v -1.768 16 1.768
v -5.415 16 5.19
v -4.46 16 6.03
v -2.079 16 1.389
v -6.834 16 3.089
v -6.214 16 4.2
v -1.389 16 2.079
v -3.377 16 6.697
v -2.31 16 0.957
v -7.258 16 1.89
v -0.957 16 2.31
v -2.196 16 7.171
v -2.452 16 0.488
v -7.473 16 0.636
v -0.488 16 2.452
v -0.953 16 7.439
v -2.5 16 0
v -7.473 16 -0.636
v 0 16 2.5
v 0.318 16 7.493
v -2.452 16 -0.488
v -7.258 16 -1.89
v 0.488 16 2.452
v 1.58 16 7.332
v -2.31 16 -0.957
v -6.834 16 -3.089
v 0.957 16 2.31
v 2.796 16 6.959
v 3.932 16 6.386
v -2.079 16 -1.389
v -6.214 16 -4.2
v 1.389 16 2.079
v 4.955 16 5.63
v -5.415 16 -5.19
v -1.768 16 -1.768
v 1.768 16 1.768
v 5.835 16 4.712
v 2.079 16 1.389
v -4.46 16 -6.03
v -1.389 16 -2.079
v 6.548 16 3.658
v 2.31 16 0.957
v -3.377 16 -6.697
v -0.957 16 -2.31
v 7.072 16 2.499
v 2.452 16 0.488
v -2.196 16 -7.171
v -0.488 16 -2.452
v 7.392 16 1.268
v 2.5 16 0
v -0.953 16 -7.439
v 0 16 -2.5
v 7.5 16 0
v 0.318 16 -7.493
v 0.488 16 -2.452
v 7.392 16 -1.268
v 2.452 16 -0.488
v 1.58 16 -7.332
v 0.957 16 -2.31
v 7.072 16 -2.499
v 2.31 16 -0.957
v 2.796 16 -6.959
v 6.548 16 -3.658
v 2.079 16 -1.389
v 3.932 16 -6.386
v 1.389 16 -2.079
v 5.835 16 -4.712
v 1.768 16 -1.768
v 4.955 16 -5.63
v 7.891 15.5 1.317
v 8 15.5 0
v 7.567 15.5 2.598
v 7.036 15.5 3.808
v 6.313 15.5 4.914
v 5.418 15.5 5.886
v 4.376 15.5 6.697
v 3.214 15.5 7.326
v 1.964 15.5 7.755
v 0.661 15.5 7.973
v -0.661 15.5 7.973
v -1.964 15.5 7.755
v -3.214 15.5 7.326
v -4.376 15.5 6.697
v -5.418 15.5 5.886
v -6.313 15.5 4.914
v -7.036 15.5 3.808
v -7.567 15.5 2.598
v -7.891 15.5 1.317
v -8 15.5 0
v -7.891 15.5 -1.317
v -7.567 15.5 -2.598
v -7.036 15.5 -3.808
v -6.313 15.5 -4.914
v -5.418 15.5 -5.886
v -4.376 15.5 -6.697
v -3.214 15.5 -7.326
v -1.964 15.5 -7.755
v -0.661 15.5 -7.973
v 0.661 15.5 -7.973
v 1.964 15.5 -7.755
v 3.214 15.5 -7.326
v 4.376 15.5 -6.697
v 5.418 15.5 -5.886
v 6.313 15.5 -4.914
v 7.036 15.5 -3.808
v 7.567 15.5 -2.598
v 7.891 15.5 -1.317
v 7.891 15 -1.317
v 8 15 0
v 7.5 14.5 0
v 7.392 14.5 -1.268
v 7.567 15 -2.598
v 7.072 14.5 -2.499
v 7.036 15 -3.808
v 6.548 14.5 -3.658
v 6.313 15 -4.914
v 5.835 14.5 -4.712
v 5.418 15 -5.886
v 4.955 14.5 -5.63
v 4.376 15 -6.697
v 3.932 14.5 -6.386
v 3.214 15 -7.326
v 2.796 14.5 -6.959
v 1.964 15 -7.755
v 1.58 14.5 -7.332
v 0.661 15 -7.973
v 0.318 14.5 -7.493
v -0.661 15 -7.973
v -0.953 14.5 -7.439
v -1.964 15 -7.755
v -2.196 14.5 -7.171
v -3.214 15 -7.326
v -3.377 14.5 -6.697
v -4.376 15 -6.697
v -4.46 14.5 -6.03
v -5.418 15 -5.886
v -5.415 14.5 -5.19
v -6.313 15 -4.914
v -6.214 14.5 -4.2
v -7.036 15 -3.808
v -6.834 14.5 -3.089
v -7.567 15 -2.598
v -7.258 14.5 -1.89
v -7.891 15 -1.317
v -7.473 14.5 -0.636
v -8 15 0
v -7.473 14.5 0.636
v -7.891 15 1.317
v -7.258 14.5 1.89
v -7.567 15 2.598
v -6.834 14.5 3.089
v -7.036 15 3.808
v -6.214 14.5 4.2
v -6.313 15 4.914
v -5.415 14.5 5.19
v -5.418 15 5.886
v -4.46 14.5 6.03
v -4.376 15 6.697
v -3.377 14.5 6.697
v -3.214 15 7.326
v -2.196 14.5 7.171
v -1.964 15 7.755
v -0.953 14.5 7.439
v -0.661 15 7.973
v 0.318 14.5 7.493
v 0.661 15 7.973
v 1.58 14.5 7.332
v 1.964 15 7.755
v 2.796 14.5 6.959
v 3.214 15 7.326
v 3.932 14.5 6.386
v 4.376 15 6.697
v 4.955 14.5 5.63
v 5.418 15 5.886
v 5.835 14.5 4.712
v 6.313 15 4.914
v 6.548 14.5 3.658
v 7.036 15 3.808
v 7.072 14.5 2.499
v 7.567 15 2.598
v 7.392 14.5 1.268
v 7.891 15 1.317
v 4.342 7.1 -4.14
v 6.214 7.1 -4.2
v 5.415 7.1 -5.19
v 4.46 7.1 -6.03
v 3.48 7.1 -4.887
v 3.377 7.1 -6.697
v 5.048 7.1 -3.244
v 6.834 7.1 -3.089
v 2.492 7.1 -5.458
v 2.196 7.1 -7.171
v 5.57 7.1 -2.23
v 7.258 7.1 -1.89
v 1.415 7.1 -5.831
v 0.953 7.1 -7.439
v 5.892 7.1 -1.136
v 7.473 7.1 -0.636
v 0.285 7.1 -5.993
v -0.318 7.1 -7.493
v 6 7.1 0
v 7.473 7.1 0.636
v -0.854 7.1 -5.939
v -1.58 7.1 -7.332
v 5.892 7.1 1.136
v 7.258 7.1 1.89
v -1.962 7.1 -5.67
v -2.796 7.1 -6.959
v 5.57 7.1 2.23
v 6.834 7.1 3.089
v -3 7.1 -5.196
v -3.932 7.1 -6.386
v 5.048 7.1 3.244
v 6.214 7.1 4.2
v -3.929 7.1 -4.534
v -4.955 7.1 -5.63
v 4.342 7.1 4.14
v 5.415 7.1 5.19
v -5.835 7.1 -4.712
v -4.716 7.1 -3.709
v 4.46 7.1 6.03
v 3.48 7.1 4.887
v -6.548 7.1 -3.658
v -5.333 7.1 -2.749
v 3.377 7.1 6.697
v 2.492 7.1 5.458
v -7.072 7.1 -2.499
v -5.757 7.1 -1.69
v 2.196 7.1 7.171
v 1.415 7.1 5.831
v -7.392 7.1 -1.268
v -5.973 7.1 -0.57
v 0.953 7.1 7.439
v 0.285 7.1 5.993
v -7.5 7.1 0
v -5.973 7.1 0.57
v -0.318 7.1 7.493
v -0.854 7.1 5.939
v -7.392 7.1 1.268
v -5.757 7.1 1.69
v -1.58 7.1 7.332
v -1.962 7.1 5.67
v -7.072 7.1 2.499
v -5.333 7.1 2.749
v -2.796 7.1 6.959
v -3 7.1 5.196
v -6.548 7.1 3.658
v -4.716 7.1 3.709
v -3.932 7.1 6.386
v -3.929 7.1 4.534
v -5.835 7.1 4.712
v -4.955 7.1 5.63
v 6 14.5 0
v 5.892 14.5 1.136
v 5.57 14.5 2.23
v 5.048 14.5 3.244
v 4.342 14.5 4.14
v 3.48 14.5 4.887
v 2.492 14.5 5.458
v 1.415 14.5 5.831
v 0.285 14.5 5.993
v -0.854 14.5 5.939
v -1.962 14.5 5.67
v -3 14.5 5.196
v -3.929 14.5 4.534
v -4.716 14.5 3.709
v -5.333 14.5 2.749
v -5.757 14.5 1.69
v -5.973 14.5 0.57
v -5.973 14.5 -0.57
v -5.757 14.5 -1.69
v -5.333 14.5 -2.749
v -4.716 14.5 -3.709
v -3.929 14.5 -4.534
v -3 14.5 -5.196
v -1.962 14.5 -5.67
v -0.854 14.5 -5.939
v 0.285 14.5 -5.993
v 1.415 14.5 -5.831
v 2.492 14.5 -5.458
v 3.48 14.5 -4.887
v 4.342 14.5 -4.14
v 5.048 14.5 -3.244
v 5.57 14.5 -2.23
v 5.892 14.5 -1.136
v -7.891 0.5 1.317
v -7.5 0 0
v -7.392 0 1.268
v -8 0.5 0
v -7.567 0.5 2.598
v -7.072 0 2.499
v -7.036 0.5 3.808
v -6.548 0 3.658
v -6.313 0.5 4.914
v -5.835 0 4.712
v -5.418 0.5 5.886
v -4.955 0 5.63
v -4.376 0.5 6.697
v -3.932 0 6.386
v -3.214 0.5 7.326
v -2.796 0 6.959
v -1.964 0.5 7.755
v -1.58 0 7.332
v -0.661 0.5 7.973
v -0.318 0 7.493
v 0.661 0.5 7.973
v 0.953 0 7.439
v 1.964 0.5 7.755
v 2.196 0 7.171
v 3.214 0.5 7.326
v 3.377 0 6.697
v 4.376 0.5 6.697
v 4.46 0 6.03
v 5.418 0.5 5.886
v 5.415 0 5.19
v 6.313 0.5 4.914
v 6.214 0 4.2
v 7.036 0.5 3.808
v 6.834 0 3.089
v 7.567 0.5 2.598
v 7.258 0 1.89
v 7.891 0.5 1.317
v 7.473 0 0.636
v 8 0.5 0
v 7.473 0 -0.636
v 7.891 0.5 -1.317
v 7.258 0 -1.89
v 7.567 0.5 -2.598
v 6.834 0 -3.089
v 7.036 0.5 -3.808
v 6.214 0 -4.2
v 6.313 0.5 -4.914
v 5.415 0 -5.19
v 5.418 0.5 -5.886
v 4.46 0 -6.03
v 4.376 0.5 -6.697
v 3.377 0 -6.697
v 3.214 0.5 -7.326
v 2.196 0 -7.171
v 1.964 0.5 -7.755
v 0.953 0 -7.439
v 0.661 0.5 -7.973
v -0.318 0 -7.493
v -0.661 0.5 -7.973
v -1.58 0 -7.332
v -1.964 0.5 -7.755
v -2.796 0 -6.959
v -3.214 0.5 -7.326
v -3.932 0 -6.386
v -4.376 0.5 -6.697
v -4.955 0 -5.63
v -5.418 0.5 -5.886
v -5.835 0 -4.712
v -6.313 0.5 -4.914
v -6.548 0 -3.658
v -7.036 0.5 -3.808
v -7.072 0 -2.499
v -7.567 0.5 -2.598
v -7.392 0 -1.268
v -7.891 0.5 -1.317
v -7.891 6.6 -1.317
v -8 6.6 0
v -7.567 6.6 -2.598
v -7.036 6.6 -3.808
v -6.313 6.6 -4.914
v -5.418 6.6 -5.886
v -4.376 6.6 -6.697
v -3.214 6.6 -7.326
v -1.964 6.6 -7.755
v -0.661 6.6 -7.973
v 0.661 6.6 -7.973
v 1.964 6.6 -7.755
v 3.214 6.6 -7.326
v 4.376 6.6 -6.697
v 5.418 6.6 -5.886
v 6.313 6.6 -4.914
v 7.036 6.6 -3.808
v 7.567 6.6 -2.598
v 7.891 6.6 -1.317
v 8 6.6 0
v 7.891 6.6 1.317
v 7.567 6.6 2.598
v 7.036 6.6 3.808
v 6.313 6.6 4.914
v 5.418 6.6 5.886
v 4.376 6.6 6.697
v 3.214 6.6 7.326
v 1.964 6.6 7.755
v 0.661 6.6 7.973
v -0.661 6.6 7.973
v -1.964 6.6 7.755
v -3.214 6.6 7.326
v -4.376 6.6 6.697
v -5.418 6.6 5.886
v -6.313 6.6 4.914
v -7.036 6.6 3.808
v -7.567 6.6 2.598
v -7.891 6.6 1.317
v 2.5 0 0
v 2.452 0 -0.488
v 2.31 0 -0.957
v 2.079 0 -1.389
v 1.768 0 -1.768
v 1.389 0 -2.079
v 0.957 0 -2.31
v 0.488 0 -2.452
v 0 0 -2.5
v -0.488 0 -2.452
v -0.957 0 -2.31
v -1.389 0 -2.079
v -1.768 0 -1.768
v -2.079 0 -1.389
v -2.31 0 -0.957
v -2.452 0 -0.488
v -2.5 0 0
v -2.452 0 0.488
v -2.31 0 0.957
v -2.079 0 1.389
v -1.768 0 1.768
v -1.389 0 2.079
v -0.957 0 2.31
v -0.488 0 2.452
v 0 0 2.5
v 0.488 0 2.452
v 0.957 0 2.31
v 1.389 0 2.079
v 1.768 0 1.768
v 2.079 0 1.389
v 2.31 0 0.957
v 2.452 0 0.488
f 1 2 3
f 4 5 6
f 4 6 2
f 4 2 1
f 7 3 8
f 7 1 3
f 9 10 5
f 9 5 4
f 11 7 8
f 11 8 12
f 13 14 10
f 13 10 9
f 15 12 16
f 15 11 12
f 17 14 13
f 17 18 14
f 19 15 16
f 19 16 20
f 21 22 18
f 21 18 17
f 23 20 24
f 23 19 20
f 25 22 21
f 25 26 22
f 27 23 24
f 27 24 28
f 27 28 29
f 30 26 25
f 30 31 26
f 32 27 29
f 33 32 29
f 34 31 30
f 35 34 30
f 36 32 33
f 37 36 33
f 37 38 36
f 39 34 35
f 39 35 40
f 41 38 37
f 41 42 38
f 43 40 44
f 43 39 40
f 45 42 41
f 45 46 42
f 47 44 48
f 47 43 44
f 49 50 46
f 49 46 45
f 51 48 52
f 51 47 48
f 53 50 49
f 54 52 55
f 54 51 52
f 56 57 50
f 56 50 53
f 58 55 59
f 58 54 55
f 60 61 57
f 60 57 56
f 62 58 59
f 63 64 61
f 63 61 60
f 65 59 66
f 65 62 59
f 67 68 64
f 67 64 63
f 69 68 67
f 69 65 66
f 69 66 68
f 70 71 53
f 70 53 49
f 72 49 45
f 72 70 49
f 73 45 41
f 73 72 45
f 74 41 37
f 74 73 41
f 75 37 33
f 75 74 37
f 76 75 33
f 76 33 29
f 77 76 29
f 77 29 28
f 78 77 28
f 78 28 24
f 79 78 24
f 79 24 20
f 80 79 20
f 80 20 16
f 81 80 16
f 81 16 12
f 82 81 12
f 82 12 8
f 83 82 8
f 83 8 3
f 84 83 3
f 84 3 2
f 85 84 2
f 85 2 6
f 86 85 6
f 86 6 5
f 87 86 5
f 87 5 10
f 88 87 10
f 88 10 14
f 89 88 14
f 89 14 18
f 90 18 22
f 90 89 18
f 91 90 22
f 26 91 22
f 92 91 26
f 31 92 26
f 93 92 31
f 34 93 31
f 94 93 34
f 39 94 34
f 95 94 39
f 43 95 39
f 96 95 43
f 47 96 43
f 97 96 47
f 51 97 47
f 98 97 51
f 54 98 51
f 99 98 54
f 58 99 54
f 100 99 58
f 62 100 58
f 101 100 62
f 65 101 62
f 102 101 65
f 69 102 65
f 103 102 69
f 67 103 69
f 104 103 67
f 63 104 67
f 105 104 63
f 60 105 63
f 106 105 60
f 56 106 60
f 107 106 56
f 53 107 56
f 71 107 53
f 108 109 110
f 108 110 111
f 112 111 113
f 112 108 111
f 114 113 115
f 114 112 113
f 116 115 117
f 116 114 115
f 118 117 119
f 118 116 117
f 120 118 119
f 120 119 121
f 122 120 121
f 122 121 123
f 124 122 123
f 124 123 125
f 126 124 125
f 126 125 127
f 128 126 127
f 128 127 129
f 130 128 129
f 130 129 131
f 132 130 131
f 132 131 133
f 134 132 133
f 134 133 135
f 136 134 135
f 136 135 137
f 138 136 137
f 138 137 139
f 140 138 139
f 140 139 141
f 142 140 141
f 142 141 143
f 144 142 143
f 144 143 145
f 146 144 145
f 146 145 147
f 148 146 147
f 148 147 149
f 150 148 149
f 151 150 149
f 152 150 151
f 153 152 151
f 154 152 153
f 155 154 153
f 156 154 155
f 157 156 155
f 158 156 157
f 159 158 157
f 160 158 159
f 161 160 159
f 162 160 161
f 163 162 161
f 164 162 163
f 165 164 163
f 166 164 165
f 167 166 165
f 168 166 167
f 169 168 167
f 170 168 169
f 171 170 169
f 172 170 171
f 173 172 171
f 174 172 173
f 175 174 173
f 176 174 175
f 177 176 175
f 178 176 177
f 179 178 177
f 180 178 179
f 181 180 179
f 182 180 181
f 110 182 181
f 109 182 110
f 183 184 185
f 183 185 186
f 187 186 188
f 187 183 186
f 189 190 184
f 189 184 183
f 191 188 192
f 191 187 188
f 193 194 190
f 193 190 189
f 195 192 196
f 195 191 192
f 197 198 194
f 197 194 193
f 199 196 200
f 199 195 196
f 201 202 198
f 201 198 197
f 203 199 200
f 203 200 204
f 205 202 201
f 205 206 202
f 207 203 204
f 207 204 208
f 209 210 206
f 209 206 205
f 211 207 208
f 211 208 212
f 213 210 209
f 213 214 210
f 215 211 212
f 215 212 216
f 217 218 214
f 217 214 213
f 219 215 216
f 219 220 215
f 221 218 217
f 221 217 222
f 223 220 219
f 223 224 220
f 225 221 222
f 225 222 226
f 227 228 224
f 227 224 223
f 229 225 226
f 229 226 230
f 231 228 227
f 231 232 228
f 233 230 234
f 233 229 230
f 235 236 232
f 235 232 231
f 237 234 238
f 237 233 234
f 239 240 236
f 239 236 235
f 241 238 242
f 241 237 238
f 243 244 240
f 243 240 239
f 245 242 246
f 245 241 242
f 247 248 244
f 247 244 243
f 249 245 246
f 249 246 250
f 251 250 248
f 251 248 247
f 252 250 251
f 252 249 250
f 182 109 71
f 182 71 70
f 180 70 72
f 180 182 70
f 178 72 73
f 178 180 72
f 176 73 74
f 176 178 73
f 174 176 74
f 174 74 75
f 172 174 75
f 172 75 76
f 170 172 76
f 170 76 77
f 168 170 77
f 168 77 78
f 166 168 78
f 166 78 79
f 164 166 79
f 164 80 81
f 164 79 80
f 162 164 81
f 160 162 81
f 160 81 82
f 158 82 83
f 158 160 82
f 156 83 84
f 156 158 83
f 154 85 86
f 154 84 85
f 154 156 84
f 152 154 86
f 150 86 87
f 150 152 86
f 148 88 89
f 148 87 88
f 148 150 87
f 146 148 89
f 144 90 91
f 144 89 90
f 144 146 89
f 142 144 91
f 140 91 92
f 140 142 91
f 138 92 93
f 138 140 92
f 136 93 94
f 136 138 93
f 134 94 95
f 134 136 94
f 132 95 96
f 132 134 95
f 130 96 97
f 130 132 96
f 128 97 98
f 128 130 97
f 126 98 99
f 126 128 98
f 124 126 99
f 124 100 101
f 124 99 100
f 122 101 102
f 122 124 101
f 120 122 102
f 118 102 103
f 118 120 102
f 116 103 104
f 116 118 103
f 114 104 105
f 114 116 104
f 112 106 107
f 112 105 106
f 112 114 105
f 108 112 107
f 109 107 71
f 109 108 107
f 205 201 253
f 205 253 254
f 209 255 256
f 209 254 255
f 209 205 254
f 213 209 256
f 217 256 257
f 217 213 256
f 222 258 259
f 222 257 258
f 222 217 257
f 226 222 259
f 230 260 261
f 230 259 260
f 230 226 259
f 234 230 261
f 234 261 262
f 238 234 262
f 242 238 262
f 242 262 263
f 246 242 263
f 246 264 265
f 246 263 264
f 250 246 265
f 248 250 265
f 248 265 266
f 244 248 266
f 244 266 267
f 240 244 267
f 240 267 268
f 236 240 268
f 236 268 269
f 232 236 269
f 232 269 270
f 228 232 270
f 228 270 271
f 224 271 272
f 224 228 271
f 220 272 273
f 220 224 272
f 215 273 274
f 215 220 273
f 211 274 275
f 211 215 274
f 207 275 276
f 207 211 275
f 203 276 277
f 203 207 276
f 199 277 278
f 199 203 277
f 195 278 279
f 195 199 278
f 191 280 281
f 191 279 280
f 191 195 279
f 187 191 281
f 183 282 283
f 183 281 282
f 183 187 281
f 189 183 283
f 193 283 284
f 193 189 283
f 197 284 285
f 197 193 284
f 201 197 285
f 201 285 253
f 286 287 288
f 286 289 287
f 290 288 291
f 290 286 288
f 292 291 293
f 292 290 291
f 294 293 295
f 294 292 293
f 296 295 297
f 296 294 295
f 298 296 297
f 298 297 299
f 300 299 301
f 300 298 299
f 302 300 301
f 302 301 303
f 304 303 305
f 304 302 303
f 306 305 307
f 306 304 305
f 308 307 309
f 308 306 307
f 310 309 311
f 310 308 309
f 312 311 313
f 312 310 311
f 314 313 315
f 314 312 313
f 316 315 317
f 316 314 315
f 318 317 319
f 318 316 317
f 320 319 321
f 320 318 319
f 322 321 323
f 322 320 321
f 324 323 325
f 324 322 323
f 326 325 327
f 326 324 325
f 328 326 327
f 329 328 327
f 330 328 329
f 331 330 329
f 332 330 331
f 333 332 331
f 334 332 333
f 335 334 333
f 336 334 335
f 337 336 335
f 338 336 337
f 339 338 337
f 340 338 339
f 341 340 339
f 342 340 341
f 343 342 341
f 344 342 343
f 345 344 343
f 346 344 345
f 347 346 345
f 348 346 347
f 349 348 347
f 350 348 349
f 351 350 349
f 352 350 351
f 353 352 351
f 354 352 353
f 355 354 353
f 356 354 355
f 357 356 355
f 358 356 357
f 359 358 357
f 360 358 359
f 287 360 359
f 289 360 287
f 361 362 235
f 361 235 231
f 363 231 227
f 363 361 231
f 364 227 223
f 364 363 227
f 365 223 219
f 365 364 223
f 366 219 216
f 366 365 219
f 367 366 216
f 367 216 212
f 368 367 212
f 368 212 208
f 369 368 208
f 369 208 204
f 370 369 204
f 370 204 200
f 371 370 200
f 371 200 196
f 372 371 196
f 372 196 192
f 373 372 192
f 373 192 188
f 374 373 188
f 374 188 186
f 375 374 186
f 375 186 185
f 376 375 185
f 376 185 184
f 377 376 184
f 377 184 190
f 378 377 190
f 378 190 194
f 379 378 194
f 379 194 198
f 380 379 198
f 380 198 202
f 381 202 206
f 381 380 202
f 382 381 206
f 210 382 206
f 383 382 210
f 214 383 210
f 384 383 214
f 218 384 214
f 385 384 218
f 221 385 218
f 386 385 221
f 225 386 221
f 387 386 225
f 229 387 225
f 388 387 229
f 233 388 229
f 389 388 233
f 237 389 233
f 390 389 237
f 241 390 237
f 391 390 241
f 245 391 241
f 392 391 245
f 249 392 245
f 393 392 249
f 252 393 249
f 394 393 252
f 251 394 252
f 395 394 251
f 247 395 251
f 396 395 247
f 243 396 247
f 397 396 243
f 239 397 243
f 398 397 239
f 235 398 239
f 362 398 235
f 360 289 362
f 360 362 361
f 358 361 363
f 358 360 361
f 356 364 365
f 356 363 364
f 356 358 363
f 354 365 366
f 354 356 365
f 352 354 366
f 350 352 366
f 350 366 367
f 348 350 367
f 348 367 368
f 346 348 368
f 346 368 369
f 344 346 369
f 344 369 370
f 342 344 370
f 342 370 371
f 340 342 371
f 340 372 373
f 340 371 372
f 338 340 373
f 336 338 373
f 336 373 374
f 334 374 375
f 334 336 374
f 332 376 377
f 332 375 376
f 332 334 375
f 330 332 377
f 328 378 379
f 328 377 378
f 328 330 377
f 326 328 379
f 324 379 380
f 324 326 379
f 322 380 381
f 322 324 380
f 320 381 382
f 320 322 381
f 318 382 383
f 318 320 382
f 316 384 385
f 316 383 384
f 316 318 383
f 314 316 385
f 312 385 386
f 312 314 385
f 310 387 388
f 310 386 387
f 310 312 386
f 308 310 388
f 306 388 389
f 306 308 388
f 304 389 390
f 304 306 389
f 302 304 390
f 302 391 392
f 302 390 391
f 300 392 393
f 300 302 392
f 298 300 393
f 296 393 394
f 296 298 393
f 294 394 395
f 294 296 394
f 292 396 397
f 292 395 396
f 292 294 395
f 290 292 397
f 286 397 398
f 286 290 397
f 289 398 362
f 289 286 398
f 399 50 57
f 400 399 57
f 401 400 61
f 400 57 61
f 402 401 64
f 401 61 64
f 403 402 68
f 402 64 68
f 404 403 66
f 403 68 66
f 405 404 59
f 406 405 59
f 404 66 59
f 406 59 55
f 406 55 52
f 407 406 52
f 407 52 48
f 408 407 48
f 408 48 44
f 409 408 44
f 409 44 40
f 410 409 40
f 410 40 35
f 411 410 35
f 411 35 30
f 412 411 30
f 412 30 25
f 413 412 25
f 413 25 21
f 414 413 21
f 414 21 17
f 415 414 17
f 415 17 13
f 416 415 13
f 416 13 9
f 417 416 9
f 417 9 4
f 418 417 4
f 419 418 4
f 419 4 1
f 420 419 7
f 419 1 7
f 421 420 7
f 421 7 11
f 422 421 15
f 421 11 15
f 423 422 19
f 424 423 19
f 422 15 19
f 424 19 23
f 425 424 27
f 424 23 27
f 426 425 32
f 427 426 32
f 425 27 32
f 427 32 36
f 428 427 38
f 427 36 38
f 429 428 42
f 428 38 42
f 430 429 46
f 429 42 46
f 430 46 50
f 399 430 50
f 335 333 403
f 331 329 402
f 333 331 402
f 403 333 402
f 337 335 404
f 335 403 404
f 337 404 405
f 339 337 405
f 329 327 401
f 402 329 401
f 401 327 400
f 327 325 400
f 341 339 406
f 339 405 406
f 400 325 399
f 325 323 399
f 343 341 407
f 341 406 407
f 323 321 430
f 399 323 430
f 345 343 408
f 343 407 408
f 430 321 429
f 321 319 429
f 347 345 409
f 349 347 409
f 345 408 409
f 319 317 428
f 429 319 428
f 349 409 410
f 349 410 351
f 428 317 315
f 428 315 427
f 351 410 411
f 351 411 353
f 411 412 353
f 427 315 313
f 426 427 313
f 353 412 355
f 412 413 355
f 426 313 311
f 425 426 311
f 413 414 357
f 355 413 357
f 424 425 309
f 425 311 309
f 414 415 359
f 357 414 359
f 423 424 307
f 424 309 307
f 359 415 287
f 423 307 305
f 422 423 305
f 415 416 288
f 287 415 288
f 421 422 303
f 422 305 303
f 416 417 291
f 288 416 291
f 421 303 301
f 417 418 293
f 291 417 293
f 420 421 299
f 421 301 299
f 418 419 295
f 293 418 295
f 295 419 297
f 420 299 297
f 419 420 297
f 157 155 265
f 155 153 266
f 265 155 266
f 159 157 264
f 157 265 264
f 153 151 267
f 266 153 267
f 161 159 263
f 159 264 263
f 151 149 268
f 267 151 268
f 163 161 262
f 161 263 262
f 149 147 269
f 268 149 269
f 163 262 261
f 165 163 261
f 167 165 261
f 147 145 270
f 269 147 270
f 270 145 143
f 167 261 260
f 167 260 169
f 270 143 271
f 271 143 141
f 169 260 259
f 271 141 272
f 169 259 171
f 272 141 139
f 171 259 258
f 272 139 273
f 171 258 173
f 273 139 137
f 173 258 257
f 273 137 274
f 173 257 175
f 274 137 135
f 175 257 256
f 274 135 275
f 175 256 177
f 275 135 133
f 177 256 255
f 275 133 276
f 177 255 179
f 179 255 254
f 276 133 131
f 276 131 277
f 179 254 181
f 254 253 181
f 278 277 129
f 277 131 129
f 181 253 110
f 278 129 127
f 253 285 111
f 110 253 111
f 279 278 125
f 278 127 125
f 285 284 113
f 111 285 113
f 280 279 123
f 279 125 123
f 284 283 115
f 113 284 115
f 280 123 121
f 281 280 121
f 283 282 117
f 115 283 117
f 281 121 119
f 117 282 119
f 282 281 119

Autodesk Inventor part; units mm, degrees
ref_plane "YZ Plane" through (0, 0, 0) normal (1, 0, 0) x (0, 1, 0)
ref_plane "XZ Plane" through (0, 0, 0) normal (0, 1, 0) x (-1, 0, 0)
ref_plane "XY Plane" through (0, 0, 0) normal (0, 0, 1) x (1, 0, 0)
sketch "Sketch1" plane through (0, 0, 0) normal (0, 1, 0) x (-1, 0, 0)
  circle A0 centre (0, 0) radius 8
  dimension "d0" = 16
extrude "Extrusion1" add sketch "Sketch1" along normal blind 7.1
sketch "Sketch2" plane through (0, 7.1, 0) normal (0, 1, 0) x (1, 0, 0)
  circle A0 centre (0, 0) radius 6
  dimension "d3" = 12
extrude "Extrusion2" add sketch "Sketch2" along normal blind 7.4
sketch "Sketch3" plane through (0, 14.5, 0) normal (0, 1, 0) x (1, 0, 0)
  circle A0 centre (0, 0) radius 8 projected
extrude "Extrusion3" add sketch "Sketch3" along normal blind 1.5
chamfer "Chamfer1" distance 0.5 angle 45 4 edges at (-8, 16, 0) (-8, 14.5, 0) (8, 7.1, 0) (8, 0, 0)
sketch "Sketch4" plane through (0, 16, 0) normal (0, 1, 0) x (1, 0, 0)
  circle A0 centre (0, 0) radius 2.5
  dimension "d11" = 5
extrude "Extrusion4" cut sketch "Sketch4" against normal blind 16
properties part number "2GT_wheel"
